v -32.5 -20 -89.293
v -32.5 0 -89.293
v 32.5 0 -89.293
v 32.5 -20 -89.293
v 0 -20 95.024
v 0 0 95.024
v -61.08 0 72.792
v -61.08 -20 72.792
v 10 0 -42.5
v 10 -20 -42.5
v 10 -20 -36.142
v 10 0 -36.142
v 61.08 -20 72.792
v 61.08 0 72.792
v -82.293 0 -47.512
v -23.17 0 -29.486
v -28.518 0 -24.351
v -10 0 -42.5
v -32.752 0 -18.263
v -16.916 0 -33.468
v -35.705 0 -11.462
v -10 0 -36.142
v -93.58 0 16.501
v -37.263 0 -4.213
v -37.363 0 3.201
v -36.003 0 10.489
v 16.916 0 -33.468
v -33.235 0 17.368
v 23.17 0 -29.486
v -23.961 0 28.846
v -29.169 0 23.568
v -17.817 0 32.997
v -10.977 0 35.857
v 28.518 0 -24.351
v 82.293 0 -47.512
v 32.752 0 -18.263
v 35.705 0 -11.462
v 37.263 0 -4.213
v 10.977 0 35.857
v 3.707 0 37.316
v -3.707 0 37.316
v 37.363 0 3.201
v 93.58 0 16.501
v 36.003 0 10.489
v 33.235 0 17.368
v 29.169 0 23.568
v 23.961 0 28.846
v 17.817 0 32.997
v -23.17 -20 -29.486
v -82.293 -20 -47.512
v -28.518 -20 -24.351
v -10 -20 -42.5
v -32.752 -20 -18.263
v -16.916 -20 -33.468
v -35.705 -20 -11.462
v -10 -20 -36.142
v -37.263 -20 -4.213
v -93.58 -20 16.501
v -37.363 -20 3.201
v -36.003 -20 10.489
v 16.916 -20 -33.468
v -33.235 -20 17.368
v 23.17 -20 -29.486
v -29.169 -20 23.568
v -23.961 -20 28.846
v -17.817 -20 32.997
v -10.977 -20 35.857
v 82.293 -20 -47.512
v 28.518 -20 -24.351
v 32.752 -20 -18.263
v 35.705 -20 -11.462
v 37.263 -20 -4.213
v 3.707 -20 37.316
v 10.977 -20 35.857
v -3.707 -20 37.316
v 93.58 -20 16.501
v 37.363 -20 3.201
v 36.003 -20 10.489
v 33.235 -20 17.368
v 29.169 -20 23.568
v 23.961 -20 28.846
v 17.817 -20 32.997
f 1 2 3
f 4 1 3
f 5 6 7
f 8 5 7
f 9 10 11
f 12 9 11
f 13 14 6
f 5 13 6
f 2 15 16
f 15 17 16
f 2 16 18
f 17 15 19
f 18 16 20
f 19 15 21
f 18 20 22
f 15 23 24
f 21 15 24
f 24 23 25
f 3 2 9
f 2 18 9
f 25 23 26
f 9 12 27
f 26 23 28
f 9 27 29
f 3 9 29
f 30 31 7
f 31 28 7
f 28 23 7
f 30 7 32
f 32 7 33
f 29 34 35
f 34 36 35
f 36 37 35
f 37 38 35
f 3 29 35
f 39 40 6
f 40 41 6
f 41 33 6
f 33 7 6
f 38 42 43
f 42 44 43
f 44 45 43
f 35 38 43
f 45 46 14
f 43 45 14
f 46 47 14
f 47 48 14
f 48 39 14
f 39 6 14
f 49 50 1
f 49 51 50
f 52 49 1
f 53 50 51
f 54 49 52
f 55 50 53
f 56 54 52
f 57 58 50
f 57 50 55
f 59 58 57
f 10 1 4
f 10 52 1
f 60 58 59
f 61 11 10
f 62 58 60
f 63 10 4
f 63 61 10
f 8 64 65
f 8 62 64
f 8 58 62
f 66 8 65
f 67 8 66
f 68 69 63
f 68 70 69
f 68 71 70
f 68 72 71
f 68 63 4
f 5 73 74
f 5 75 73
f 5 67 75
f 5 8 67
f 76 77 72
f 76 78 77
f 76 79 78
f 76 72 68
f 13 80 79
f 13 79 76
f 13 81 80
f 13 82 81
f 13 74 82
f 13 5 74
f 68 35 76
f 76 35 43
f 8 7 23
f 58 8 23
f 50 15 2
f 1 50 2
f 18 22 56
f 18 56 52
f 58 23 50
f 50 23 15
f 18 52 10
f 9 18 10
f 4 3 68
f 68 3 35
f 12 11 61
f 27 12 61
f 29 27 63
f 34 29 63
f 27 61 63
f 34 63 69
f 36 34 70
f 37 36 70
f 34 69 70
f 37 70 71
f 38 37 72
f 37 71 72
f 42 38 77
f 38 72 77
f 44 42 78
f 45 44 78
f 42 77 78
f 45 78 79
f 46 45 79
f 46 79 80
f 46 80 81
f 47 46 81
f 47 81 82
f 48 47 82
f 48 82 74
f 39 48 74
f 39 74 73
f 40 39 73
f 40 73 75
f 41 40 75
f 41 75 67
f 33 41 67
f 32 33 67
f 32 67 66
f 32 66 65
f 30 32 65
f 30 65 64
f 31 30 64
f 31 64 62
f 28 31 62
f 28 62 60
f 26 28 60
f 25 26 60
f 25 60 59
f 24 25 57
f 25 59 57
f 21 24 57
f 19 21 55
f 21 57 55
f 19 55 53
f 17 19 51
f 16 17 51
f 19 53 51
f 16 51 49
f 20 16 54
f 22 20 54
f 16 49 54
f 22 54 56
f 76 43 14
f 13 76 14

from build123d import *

# Parameters (mm, degrees)
F1_DEPTH = 20
F3_DEPTH = 25


with BuildPart() as f1:
    # F0 (on Front) → F1 (new body)
    with BuildSketch(Plane.XZ):
        Polygon((-32.5, -89.293016), (32.5, -89.293016), (82.292889, -47.511822), (93.58002, 16.500682), (61.08002, 72.792334), (0, 95.023643), (-61.08002, 72.792334), (-93.58002, 16.500682), (-82.292889, -47.511822), align=None)
    extrude(amount=F1_DEPTH)

    # F2 (on face) → F3 (cut)
    with BuildSketch(Plane.XZ.offset(20)):
        with BuildLine():
            Line((10, -42.5), (10, -36.142081))
            ThreePointArc((10, -36.142081), (0, 37.5), (-10, -36.142081))
            Line((-10, -36.142081), (-10, -42.5))
            Line((-10, -42.5), (0, -42.5))
            Line((0, -42.5), (10, -42.5))
        make_face()
    extrude(amount=-F3_DEPTH, mode=Mode.SUBTRACT)


solid = f1.part
